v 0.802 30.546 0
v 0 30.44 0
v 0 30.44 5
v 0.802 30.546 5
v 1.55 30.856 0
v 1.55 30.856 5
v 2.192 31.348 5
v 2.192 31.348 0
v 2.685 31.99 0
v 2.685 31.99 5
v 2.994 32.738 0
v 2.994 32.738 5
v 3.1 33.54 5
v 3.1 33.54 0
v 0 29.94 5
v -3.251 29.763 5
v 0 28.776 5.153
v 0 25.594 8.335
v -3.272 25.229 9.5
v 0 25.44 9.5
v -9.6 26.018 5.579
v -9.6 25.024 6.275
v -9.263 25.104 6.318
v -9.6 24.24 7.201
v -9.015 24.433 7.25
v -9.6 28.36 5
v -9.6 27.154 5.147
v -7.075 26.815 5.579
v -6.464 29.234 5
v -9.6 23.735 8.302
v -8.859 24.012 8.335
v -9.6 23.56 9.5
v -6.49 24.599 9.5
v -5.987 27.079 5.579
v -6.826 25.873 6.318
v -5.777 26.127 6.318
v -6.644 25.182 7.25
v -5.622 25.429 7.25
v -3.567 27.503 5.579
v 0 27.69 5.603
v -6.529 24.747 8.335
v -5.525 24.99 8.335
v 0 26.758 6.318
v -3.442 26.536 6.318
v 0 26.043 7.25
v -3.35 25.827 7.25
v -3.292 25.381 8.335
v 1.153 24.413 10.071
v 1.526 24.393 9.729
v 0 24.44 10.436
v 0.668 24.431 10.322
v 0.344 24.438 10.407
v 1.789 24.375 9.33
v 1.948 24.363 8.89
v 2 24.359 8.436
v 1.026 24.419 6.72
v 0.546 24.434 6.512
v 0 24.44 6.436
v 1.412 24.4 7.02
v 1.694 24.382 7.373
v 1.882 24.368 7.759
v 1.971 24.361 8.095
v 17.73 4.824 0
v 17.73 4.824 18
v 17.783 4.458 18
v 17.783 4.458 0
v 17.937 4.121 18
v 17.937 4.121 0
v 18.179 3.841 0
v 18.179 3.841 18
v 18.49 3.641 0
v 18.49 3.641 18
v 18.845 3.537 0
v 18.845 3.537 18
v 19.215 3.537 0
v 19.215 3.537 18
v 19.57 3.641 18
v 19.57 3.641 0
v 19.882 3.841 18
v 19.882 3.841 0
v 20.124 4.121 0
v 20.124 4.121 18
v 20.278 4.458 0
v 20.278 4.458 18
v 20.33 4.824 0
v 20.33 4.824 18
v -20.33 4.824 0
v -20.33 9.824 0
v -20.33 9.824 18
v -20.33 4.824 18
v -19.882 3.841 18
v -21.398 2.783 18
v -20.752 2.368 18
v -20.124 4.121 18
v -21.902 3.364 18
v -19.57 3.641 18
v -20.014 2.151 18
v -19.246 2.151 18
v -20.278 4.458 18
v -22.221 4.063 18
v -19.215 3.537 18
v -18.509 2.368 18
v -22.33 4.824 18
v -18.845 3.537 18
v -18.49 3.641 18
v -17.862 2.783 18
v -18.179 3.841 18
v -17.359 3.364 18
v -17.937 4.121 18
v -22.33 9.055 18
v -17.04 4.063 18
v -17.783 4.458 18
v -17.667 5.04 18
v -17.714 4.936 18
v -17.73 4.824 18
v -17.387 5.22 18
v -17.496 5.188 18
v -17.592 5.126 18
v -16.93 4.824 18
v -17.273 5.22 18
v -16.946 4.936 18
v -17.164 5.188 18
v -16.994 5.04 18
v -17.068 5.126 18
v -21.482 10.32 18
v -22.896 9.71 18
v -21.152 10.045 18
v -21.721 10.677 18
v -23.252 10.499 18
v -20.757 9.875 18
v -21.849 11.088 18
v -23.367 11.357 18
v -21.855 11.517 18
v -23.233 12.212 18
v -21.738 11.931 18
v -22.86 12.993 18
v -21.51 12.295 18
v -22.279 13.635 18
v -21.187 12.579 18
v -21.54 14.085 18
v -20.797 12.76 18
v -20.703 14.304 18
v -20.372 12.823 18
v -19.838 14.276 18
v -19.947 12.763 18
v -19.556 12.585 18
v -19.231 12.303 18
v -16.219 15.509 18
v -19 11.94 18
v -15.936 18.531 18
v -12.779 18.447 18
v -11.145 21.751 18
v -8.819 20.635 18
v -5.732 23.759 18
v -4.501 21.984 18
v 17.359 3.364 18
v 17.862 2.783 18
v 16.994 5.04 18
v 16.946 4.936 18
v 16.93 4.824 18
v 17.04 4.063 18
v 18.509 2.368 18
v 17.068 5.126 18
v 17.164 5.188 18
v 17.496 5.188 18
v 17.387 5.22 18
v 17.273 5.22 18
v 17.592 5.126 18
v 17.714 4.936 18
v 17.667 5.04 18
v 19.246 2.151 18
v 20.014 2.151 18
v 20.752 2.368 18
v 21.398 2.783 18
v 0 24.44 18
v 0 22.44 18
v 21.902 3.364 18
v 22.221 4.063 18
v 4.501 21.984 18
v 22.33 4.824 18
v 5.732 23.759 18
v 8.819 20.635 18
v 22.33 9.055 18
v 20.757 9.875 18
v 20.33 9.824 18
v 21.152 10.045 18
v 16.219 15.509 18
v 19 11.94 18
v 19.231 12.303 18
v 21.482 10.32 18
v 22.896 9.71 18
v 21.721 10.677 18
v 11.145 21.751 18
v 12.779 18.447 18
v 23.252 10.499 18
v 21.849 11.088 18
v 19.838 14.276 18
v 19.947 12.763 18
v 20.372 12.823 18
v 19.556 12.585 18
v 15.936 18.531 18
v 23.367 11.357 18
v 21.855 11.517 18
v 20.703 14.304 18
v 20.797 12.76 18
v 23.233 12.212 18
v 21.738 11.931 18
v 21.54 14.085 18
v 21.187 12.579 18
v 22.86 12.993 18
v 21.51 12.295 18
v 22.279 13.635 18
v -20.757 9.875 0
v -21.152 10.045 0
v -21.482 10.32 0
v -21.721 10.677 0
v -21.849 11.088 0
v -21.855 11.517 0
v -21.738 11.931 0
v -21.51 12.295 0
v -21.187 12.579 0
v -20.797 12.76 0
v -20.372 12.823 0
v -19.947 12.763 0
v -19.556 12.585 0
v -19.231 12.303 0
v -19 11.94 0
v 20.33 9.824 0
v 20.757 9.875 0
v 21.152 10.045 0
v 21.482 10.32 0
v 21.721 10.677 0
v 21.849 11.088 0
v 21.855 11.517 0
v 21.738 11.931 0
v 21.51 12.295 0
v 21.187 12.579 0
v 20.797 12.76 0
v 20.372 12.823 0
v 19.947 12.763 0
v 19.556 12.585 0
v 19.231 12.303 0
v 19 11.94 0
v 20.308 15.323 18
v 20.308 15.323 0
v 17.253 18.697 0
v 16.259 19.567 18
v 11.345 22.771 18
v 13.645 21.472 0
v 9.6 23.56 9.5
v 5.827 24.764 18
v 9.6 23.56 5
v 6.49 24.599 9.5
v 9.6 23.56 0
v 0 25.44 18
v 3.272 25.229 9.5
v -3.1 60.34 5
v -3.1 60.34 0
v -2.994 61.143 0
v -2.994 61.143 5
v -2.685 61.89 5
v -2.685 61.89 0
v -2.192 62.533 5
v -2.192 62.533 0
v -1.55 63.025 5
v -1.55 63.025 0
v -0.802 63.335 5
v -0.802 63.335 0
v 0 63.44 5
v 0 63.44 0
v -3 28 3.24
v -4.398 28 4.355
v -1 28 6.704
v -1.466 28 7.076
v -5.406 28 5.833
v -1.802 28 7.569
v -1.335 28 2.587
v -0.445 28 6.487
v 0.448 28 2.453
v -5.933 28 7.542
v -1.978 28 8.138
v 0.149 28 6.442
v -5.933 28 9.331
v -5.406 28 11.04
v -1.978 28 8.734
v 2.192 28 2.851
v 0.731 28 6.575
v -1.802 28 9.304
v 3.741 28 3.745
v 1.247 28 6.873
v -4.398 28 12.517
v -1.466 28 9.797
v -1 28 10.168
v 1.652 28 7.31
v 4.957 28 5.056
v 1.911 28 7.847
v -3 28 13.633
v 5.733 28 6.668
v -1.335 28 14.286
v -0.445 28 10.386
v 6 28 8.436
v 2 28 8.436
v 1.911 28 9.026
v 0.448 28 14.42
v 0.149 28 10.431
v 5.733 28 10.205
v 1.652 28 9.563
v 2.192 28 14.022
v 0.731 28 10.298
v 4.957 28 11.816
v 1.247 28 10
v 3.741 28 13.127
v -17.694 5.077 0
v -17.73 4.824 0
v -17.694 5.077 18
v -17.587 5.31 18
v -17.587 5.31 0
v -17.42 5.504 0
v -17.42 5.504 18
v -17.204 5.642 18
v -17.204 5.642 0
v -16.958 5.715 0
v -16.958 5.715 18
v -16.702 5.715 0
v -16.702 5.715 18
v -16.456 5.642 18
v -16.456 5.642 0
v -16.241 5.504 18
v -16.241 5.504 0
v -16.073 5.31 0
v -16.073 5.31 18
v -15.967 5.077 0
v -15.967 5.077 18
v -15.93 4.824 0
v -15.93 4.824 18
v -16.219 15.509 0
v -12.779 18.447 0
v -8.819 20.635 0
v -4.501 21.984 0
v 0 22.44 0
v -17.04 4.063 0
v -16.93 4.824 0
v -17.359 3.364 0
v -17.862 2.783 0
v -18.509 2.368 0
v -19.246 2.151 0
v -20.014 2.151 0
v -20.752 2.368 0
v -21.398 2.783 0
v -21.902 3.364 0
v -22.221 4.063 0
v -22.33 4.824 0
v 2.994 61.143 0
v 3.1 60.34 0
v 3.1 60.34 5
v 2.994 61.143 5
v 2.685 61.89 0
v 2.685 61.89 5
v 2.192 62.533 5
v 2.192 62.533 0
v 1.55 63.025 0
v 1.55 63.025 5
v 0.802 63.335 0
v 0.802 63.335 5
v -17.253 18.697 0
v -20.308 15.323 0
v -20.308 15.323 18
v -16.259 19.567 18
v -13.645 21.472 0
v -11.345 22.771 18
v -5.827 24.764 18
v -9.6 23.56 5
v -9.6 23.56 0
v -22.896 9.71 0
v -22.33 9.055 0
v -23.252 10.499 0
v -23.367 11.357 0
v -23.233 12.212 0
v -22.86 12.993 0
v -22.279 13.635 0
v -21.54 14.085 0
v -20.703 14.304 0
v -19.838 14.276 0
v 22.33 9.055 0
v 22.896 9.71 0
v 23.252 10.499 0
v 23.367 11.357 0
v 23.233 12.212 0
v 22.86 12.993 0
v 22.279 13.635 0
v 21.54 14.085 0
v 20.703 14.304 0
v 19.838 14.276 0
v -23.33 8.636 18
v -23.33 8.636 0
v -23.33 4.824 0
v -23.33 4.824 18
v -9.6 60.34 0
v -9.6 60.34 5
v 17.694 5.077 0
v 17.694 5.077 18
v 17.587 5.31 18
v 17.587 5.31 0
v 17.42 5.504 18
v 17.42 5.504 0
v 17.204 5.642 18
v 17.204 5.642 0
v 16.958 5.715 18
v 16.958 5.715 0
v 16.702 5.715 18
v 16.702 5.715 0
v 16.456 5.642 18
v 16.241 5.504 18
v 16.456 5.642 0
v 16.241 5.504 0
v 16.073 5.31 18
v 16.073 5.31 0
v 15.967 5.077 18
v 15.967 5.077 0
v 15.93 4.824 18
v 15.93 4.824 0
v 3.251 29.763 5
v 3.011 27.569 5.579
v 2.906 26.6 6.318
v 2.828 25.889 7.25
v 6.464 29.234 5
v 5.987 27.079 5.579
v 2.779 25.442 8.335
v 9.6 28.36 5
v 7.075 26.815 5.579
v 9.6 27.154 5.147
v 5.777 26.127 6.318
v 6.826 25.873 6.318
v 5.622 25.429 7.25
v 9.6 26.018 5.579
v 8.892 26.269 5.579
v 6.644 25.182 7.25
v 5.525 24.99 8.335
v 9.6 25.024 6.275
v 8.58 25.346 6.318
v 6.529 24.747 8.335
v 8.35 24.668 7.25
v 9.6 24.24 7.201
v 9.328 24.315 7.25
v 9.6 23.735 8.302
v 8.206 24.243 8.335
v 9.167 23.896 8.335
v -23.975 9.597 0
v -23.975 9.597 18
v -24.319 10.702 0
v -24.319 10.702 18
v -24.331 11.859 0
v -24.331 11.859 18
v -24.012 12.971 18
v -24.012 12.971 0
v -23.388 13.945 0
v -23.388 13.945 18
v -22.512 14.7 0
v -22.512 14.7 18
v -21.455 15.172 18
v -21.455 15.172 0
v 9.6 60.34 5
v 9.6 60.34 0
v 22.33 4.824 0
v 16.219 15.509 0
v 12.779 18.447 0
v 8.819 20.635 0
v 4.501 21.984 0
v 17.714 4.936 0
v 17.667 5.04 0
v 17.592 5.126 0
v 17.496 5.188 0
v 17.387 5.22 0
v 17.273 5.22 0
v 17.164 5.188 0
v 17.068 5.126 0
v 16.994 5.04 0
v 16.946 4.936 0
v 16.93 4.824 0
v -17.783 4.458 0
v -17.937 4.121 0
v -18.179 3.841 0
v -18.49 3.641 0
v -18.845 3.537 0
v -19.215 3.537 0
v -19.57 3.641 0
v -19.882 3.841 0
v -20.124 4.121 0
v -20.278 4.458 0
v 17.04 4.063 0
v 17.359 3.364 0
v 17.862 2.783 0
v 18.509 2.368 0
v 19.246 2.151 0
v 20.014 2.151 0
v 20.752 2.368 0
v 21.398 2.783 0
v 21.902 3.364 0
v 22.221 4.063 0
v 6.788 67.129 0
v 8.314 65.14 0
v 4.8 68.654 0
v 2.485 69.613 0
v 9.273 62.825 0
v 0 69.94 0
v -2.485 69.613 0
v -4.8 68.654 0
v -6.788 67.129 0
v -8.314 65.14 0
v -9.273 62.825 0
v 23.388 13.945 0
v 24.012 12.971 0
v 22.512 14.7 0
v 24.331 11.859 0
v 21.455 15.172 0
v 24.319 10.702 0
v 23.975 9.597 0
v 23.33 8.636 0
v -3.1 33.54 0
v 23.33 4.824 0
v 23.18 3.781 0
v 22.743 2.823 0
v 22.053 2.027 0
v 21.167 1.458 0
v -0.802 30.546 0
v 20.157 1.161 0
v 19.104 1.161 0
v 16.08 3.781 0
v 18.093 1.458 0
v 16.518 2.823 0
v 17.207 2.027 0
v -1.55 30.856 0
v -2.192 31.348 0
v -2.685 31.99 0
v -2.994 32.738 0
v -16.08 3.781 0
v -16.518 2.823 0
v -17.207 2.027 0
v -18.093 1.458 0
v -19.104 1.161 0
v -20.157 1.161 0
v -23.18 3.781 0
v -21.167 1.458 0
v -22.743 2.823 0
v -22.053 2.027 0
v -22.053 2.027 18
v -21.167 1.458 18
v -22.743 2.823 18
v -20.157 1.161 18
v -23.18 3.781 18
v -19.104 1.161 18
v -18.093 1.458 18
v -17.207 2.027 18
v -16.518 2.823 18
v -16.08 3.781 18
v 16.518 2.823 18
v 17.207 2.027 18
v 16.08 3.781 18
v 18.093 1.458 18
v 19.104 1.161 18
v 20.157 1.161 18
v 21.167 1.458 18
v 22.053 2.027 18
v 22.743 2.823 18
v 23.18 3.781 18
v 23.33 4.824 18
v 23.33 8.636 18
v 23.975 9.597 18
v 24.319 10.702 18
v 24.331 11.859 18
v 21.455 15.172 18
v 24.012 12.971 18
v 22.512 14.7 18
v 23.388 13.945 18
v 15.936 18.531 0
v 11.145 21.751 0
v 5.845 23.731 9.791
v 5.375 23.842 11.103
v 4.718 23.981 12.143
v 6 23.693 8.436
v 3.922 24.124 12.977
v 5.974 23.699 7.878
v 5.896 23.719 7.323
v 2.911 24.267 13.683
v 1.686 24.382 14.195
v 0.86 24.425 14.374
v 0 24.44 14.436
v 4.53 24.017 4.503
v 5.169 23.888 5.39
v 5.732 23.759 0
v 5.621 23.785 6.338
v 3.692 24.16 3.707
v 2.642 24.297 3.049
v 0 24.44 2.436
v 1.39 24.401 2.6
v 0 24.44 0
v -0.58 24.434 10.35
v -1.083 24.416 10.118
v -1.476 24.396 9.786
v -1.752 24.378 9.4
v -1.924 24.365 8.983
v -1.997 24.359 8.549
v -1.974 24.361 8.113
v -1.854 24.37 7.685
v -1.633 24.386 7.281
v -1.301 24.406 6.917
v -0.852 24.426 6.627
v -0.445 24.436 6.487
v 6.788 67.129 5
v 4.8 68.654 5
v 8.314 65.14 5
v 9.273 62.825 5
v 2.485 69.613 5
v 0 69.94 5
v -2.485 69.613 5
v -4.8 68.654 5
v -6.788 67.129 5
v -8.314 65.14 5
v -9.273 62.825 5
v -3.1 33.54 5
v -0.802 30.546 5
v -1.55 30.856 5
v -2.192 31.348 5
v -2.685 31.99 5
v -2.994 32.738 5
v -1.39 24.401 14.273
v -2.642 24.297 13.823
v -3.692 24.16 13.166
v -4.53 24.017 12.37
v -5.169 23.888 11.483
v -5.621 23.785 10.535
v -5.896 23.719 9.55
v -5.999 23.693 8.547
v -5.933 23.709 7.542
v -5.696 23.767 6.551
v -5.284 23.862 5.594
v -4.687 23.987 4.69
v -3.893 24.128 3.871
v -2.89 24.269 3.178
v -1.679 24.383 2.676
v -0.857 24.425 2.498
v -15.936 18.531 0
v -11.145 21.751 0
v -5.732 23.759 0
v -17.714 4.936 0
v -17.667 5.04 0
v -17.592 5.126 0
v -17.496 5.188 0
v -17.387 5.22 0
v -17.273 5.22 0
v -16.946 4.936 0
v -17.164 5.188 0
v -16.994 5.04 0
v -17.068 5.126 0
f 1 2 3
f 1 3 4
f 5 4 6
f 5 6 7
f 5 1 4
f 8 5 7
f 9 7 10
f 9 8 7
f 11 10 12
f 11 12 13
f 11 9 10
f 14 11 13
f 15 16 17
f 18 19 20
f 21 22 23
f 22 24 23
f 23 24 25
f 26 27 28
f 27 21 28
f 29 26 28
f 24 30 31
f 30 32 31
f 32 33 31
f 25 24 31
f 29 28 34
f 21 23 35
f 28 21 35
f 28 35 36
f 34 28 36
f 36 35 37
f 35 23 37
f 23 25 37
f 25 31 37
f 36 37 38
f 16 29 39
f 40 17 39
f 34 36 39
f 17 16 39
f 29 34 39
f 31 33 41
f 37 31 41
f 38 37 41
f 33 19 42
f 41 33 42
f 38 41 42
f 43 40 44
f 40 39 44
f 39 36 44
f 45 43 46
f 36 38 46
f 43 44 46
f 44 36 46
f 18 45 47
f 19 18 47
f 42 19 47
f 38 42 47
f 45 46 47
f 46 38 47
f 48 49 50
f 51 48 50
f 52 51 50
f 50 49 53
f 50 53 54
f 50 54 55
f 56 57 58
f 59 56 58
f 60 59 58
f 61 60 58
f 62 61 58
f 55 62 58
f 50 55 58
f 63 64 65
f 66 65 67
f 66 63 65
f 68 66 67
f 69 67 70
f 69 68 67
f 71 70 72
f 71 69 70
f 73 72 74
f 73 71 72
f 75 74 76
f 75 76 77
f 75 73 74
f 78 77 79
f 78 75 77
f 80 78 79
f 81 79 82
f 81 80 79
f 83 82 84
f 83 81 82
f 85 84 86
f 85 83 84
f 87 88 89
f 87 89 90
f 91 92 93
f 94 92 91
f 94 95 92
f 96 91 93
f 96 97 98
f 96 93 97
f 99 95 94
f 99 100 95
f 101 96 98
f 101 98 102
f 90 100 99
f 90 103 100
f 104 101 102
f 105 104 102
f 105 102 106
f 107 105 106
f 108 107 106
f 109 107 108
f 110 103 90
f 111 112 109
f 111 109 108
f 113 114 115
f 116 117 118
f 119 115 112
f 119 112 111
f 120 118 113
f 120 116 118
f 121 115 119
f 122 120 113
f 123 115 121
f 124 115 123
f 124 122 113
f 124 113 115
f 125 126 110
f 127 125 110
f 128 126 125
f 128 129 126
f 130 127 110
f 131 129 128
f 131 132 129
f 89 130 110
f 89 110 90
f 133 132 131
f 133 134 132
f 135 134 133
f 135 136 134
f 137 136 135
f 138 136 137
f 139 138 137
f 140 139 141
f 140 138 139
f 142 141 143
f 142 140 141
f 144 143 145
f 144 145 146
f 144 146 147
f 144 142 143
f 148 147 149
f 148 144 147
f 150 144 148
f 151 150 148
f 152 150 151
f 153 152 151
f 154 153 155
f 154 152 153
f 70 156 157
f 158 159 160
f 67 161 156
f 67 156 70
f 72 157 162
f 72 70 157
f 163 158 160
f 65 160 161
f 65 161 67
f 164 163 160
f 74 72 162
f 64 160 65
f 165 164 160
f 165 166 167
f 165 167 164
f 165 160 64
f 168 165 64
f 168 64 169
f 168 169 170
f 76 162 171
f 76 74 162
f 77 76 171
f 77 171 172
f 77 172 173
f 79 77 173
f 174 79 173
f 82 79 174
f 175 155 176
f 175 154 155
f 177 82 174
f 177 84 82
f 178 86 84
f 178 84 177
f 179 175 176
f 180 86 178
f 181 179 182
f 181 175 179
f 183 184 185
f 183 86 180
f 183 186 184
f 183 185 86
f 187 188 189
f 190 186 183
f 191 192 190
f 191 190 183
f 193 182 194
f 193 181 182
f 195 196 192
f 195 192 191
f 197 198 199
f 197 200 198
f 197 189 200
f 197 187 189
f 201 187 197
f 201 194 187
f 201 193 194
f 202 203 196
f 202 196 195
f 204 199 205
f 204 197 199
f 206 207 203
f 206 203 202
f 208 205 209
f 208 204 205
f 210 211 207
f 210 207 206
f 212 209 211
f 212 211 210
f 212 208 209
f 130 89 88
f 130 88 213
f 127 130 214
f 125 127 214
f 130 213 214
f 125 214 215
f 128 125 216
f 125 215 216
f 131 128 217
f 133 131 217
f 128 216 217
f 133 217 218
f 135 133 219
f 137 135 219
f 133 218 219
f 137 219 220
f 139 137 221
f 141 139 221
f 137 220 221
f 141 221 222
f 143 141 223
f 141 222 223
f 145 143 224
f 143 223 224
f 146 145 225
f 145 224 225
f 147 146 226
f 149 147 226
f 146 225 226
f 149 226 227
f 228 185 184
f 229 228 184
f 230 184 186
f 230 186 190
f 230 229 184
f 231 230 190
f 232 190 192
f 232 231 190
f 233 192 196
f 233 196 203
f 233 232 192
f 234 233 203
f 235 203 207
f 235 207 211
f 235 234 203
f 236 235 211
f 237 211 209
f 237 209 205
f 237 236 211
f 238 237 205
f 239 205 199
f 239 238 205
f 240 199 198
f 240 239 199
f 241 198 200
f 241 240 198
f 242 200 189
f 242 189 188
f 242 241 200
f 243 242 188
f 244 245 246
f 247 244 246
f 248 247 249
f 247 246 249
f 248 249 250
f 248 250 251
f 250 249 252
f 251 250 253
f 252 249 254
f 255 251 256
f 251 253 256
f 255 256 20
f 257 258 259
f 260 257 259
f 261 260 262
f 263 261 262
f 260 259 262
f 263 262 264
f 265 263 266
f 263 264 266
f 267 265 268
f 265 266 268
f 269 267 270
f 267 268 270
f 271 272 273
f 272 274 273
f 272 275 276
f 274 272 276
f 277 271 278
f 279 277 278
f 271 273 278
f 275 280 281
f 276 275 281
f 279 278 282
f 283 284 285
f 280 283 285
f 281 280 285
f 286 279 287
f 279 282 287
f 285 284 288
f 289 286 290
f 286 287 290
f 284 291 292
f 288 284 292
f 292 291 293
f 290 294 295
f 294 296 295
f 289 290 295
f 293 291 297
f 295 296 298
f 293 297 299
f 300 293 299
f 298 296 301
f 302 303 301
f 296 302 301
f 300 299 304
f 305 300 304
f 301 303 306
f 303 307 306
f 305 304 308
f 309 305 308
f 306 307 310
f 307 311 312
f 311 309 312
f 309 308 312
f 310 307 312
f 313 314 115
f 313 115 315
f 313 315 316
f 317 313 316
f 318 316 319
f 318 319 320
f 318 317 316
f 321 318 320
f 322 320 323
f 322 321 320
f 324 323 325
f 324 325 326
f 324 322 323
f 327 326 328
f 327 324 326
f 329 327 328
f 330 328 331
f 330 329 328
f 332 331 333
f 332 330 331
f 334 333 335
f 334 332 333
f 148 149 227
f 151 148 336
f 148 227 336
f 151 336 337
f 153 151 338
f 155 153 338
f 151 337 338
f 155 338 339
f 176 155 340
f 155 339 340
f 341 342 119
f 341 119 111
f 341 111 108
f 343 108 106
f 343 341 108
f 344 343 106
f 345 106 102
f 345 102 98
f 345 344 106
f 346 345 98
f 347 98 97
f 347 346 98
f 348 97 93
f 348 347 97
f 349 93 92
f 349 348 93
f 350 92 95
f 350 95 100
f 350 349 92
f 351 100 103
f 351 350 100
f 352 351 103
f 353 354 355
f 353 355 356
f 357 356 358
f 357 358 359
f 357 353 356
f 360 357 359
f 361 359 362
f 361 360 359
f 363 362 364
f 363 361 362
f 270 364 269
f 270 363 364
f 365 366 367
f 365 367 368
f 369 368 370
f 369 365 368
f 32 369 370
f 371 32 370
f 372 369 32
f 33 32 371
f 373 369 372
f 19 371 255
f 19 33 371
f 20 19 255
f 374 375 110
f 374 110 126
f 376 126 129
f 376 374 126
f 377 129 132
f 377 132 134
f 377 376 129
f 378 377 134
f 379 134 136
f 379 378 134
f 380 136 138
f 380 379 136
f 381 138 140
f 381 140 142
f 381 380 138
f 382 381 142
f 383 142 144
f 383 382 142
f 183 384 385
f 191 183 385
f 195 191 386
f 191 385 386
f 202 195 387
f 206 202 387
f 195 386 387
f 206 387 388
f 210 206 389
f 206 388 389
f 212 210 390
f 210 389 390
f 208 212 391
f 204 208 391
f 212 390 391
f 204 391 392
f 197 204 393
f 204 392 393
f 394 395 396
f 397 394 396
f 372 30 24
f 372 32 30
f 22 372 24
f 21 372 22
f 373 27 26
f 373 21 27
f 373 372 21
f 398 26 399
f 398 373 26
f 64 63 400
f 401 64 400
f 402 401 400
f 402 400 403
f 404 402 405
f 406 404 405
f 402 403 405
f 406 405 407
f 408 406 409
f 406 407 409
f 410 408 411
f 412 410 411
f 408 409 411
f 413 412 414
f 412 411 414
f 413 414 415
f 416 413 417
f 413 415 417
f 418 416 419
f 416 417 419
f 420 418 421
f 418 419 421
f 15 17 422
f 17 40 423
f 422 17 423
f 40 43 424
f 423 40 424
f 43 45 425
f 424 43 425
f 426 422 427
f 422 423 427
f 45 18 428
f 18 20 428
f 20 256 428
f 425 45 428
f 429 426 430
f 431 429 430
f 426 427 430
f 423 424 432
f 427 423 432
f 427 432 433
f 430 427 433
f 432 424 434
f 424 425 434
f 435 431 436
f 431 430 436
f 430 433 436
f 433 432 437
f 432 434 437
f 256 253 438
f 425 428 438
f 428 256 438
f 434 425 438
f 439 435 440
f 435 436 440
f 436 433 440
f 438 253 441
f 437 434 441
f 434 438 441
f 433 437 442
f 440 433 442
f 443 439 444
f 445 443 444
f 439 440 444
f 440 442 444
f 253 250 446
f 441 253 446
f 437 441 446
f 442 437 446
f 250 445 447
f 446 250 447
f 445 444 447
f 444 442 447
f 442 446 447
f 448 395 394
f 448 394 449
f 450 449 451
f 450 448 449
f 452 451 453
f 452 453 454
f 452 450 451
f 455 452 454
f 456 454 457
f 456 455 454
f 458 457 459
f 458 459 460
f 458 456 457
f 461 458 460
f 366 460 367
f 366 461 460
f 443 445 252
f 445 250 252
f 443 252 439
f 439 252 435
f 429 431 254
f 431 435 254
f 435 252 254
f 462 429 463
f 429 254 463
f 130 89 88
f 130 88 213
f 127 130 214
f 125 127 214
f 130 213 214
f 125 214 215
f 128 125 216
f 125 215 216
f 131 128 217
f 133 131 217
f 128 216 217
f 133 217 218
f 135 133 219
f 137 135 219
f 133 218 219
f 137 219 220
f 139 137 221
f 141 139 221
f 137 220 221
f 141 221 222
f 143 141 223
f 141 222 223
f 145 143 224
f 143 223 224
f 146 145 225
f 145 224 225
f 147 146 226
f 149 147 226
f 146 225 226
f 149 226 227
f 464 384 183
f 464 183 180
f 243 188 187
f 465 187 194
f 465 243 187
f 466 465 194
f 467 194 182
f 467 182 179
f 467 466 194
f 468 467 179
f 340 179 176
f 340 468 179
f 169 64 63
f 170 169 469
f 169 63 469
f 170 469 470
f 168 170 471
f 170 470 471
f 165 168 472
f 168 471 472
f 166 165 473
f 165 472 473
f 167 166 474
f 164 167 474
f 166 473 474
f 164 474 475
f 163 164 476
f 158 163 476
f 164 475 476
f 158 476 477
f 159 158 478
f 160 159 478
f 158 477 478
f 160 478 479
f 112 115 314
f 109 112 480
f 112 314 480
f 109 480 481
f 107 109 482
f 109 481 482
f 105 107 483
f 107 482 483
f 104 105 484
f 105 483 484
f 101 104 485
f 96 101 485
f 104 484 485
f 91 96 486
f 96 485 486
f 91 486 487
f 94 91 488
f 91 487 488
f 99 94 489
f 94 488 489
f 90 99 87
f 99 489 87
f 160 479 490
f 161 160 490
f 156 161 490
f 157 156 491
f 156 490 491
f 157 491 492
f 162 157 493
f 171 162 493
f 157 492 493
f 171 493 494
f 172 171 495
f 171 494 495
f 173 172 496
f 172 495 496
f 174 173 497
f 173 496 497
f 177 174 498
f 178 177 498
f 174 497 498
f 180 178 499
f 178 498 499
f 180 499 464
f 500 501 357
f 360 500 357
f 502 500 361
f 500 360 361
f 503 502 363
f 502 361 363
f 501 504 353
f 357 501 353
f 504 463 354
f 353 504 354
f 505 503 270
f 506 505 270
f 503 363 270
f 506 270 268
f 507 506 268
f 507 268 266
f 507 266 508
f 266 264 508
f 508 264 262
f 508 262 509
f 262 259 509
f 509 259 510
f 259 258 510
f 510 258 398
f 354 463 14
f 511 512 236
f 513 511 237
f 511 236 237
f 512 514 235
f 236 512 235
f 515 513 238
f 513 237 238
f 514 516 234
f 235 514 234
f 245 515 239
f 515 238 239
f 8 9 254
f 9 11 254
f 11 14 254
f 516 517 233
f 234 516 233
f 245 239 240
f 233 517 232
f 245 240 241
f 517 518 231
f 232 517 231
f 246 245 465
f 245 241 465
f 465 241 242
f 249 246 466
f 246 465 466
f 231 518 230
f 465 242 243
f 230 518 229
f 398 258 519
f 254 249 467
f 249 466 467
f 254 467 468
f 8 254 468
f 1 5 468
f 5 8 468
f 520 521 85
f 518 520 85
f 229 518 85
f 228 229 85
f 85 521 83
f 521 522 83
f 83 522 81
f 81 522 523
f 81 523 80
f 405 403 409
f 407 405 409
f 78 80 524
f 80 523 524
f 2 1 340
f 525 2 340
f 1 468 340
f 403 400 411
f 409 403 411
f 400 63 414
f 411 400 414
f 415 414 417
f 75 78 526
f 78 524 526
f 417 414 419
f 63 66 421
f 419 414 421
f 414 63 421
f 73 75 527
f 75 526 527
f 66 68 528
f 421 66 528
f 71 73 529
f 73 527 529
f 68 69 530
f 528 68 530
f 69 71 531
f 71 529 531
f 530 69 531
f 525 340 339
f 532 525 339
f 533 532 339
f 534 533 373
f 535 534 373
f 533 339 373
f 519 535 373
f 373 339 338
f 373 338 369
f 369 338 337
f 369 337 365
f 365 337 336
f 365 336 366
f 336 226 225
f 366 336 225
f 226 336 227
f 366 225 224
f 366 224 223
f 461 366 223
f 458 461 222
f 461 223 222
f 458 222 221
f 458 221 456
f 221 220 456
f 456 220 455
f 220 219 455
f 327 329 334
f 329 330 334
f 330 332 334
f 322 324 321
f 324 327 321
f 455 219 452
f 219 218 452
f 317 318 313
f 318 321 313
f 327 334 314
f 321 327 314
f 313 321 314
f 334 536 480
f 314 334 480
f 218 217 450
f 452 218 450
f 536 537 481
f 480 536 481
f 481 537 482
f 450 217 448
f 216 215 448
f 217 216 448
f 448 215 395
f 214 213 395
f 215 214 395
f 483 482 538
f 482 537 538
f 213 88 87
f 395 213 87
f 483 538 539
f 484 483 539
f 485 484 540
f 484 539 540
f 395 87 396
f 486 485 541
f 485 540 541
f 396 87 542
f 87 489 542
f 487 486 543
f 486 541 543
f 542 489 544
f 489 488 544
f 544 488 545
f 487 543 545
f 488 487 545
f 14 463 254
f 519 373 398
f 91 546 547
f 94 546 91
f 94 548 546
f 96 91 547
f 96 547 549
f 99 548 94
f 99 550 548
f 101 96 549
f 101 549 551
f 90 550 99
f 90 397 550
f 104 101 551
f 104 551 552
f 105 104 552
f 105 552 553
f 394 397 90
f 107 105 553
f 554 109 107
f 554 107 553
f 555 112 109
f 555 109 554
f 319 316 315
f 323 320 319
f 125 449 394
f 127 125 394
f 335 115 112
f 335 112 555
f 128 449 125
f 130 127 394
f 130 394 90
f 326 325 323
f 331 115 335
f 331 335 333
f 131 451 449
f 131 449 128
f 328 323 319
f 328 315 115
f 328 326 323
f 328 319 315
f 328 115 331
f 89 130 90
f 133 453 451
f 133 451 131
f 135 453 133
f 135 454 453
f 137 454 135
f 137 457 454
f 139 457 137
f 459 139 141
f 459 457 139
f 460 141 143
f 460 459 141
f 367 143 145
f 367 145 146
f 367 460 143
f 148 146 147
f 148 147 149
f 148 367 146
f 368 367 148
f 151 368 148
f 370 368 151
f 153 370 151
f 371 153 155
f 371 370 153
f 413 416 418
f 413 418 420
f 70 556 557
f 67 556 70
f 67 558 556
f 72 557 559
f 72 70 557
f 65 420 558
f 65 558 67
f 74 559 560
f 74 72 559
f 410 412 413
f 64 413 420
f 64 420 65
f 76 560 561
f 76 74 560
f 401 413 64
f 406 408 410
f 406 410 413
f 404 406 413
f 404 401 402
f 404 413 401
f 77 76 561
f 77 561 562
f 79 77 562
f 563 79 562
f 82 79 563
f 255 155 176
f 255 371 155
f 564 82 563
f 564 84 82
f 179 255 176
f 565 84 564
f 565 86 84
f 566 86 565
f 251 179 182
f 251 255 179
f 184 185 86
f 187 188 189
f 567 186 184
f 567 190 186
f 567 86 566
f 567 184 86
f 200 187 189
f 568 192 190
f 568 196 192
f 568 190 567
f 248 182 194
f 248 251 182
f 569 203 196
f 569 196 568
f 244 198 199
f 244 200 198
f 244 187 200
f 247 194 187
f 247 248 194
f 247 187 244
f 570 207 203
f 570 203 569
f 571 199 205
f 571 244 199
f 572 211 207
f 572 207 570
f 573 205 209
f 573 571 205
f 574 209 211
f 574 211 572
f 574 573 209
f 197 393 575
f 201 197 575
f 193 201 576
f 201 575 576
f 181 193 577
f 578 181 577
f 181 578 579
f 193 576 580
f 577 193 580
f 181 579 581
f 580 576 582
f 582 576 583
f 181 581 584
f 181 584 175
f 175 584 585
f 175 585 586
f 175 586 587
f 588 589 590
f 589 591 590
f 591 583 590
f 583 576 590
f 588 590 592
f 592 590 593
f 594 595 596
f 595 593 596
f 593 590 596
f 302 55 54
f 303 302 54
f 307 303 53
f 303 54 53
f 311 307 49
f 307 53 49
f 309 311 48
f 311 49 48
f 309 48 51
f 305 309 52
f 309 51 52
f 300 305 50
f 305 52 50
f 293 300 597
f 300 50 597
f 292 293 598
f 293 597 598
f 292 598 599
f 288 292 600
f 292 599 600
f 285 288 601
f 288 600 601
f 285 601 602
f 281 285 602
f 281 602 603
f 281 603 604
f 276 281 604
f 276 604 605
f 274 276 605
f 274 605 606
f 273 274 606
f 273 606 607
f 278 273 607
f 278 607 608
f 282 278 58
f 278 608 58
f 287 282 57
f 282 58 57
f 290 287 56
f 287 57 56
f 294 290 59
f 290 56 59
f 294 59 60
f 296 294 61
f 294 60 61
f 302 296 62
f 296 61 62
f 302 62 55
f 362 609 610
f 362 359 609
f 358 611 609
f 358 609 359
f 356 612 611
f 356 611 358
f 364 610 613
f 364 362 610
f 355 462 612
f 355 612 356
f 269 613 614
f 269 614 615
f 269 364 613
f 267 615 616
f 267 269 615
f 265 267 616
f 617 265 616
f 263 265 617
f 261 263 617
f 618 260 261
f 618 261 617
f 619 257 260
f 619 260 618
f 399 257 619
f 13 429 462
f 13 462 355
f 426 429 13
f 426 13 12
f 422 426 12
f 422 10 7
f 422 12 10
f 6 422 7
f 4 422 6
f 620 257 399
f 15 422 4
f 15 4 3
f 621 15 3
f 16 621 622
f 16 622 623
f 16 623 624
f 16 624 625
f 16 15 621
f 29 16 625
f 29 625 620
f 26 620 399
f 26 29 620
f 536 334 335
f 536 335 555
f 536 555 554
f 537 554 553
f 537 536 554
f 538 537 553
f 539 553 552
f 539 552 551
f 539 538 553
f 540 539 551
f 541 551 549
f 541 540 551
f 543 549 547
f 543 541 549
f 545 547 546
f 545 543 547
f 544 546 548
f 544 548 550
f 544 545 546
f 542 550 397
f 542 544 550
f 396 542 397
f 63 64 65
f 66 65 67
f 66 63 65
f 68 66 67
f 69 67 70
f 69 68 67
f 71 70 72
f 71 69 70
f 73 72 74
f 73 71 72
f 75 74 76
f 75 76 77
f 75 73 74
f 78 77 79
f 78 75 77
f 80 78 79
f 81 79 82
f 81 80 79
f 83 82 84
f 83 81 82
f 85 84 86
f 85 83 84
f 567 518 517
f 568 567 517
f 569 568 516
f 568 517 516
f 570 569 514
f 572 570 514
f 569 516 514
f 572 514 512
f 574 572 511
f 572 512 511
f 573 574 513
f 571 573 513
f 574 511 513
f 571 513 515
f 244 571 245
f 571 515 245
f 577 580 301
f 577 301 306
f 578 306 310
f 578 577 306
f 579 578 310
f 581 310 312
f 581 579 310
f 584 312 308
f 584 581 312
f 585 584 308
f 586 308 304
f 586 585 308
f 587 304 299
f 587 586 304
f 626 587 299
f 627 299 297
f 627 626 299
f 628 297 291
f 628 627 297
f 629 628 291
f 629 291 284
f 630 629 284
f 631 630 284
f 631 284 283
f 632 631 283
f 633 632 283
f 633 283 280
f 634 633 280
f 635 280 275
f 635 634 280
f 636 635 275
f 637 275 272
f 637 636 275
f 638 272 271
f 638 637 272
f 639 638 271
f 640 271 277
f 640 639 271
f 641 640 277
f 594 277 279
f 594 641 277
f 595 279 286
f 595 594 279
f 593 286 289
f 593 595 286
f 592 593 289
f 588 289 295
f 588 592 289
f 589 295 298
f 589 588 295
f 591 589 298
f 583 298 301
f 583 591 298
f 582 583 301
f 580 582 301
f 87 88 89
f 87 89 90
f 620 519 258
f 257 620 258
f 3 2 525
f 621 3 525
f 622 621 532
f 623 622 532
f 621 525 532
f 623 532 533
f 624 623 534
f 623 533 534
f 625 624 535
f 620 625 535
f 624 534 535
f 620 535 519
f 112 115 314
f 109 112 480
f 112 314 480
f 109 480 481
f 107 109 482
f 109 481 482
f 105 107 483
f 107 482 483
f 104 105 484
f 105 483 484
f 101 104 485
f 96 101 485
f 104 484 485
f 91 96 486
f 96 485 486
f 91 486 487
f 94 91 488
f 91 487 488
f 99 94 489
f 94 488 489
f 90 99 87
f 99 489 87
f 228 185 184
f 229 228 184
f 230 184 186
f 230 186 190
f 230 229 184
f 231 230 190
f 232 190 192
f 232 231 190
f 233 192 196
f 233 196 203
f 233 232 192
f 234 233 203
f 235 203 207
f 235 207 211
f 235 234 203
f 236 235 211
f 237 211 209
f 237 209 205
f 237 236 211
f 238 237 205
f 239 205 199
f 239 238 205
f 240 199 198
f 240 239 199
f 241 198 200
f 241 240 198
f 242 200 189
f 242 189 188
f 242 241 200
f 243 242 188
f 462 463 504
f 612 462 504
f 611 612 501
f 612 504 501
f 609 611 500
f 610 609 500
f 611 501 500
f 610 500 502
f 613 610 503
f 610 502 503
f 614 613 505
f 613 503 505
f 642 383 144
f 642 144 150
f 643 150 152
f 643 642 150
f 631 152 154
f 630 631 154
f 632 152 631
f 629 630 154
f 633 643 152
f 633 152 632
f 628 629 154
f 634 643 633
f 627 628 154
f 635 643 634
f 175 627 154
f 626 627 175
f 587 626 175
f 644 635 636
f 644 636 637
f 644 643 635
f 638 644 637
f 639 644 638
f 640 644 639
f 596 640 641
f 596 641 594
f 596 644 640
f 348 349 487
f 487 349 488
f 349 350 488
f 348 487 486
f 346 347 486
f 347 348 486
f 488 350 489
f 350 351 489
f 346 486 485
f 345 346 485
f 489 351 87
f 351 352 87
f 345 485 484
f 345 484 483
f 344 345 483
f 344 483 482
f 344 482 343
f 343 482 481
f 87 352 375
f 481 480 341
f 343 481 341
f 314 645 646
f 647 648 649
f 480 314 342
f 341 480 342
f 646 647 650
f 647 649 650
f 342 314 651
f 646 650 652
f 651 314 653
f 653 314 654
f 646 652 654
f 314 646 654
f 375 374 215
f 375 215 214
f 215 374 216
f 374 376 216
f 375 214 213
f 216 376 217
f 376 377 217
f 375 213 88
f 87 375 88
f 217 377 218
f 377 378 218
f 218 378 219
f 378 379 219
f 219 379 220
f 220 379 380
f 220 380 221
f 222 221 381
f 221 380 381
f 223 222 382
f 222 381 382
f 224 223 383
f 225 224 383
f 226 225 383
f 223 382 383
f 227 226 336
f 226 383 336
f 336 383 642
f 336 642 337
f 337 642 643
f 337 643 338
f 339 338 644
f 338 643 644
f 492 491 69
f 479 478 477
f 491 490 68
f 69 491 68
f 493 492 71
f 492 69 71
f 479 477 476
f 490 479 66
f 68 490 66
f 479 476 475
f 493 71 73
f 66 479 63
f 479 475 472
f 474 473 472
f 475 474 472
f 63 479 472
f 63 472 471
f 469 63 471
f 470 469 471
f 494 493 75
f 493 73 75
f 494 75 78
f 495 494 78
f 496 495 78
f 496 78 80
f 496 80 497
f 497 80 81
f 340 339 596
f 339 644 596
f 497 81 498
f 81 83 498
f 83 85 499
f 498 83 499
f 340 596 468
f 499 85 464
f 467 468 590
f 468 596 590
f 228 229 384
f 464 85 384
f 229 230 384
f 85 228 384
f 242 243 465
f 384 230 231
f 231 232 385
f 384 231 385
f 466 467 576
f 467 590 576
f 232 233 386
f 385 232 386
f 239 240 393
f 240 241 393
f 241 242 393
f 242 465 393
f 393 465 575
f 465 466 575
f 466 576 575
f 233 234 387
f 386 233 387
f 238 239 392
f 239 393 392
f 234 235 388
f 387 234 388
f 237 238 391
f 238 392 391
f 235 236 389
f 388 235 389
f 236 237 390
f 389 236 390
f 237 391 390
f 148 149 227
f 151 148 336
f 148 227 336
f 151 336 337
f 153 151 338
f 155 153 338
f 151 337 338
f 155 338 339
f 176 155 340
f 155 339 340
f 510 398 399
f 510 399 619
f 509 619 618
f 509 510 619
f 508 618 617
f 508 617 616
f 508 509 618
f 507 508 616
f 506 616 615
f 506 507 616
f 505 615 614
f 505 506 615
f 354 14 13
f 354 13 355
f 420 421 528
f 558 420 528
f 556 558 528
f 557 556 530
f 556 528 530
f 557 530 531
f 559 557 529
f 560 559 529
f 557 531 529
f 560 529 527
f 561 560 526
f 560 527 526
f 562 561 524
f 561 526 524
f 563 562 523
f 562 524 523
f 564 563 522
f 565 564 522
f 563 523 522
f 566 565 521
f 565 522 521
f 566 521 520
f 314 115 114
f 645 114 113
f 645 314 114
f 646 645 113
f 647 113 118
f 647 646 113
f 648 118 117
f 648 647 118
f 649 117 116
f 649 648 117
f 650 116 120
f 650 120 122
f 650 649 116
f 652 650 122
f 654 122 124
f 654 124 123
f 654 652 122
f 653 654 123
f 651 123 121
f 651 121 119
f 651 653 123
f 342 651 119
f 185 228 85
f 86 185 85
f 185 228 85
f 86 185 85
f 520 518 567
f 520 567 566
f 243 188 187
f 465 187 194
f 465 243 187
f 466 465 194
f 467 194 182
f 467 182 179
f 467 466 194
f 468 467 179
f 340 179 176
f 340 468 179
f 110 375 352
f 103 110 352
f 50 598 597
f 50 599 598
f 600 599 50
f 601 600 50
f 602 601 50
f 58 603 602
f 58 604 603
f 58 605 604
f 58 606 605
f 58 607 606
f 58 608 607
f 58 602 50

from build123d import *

# Parameters (mm, degrees)
PAD_DEPTH     = 18
PAD001_DEPTH  = 5
FILLET_R      = 4.5
PAD002_DEPTH  = 18
PAD003_START  = -22.5
SKETCH003_R   = 6
SKETCH003_R_2 = 2
PAD003_DEPTH  = 5.5


with BuildPart() as top:
    # Sketch → Pad (new body)
    with BuildSketch(Plane.XY):
        with BuildLine():
            ThreePointArc((19, 11.940476), (10.854147, 19.640837), (0, 22.440476))
            Line((0, 22.440476), (0, 25.440476))
            ThreePointArc((20.308305, 15.322878), (11.344525, 22.771025), (0, 25.440476))
            ThreePointArc((23.330239, 8.636282), (24.012189, 12.970645), (20.308305, 15.322878))
            Line((23.330239, 8.636282), (23.330239, 4.823765))
            ThreePointArc((15.930239, 4.823765), (19.630239, 1.123765), (23.330239, 4.823765))
            ThreePointArc((17.730239, 4.823765), (16.830239, 5.723765), (15.930239, 4.823765))
            ThreePointArc((17.730239, 4.823765), (19.030239, 3.523765), (20.330239, 4.823765))
            Line((20.330239, 9.823765), (20.330239, 4.823765))
            ThreePointArc((20.330239, 9.823765), (21.637179, 12.121454), (19, 11.940476))
        make_face()
    pad = extrude(amount=PAD_DEPTH)

    # Mirrored: Pad across Sketch V_Axis
    add(pad.mirror(Plane(origin=(0, 0, 0), x_dir=(0, 0, 1), z_dir=(1, 0, 0))))

    # Sketch001 (on Face4 of Mirrored) → Pad001 (join)
    with BuildSketch(Plane(origin=(0, 0, 0), x_dir=(1, 0, 0), z_dir=(0, 0, -1))):
        with BuildLine():
            Line((-9.6, -23.559665), (-9.6, -60.340476))
            ThreePointArc((-9.6, -60.340476), (-6.788225, -67.128701), (0, -69.940476))
            Line((0, -69.940476), (0, -63.440476))
            ThreePointArc((-3.1, -60.340476), (-2.192031, -62.532507), (0, -63.440476))
            Line((-3.1, -33.540476), (-3.1, -60.340476))
            ThreePointArc((0, -30.440476), (-2.192031, -31.348445), (-3.1, -33.540476))
            Line((0, -30.440476), (0, -25.440476))
            ThreePointArc((-9.6, -23.559665), (-4.891254, -24.965846), (0, -25.440476))
        make_face()
    pad001 = extrude(amount=-PAD001_DEPTH)

    # Mirrored001: Pad001 across Sketch001 V_Axis
    add(pad001.mirror(Plane(origin=(0, 0, 0), x_dir=(0, 0, -1), z_dir=(1, 0, 0))))

    # Fillet
    fillet_edges = [top.edges().sort_by_distance(p)[0] for p in [
        (-4.891254, 24.965846, 5),
        (4.891254, 24.965846, 5),
    ]]
    fillet(fillet_edges, radius=FILLET_R)


with BuildPart() as side:
    # Sketch002 → Pad002 (new body)
    with BuildSketch(Plane.XY):
        with BuildLine():
            ThreePointArc((19, 11.940476), (10.854147, 19.640837), (0, 22.440476))
            Line((0, 22.440476), (0, 24.440476))
            ThreePointArc((19.837522, 14.27619), (11.144954, 21.75148), (0, 24.440476))
            ThreePointArc((22.330239, 9.054767), (23.07446, 12.615784), (19.837522, 14.27619))
            Line((22.330239, 9.054767), (22.330239, 4.823765))
            ThreePointArc((16.930239, 4.823765), (19.630239, 2.123765), (22.330239, 4.823765))
            ThreePointArc((17.730239, 4.823765), (17.330239, 5.223765), (16.930239, 4.823765))
            ThreePointArc((17.730239, 4.823765), (19.030239, 3.523765), (20.330239, 4.823765))
            Line((20.330239, 9.823765), (20.330239, 4.823765))
            ThreePointArc((20.330239, 9.823765), (21.637179, 12.121454), (19, 11.940476))
        make_face()
    pad002 = extrude(amount=PAD002_DEPTH)

    # Mirrored002: Pad002 across Sketch002 V_Axis
    add(pad002.mirror(Plane(origin=(0, 0, 0), x_dir=(0, 0, 1), z_dir=(1, 0, 0))))

    # Sketch003 → Pad003 (join)
    with BuildSketch(Plane.XZ.offset(PAD003_START)):
        with Locations((0, 8.436387)):
            Circle(SKETCH003_R)
        with Locations((0, 8.436387)):
            Circle(SKETCH003_R_2, mode=Mode.SUBTRACT)
    extrude(amount=-PAD003_DEPTH)


solid = Compound([top.part, side.part])
